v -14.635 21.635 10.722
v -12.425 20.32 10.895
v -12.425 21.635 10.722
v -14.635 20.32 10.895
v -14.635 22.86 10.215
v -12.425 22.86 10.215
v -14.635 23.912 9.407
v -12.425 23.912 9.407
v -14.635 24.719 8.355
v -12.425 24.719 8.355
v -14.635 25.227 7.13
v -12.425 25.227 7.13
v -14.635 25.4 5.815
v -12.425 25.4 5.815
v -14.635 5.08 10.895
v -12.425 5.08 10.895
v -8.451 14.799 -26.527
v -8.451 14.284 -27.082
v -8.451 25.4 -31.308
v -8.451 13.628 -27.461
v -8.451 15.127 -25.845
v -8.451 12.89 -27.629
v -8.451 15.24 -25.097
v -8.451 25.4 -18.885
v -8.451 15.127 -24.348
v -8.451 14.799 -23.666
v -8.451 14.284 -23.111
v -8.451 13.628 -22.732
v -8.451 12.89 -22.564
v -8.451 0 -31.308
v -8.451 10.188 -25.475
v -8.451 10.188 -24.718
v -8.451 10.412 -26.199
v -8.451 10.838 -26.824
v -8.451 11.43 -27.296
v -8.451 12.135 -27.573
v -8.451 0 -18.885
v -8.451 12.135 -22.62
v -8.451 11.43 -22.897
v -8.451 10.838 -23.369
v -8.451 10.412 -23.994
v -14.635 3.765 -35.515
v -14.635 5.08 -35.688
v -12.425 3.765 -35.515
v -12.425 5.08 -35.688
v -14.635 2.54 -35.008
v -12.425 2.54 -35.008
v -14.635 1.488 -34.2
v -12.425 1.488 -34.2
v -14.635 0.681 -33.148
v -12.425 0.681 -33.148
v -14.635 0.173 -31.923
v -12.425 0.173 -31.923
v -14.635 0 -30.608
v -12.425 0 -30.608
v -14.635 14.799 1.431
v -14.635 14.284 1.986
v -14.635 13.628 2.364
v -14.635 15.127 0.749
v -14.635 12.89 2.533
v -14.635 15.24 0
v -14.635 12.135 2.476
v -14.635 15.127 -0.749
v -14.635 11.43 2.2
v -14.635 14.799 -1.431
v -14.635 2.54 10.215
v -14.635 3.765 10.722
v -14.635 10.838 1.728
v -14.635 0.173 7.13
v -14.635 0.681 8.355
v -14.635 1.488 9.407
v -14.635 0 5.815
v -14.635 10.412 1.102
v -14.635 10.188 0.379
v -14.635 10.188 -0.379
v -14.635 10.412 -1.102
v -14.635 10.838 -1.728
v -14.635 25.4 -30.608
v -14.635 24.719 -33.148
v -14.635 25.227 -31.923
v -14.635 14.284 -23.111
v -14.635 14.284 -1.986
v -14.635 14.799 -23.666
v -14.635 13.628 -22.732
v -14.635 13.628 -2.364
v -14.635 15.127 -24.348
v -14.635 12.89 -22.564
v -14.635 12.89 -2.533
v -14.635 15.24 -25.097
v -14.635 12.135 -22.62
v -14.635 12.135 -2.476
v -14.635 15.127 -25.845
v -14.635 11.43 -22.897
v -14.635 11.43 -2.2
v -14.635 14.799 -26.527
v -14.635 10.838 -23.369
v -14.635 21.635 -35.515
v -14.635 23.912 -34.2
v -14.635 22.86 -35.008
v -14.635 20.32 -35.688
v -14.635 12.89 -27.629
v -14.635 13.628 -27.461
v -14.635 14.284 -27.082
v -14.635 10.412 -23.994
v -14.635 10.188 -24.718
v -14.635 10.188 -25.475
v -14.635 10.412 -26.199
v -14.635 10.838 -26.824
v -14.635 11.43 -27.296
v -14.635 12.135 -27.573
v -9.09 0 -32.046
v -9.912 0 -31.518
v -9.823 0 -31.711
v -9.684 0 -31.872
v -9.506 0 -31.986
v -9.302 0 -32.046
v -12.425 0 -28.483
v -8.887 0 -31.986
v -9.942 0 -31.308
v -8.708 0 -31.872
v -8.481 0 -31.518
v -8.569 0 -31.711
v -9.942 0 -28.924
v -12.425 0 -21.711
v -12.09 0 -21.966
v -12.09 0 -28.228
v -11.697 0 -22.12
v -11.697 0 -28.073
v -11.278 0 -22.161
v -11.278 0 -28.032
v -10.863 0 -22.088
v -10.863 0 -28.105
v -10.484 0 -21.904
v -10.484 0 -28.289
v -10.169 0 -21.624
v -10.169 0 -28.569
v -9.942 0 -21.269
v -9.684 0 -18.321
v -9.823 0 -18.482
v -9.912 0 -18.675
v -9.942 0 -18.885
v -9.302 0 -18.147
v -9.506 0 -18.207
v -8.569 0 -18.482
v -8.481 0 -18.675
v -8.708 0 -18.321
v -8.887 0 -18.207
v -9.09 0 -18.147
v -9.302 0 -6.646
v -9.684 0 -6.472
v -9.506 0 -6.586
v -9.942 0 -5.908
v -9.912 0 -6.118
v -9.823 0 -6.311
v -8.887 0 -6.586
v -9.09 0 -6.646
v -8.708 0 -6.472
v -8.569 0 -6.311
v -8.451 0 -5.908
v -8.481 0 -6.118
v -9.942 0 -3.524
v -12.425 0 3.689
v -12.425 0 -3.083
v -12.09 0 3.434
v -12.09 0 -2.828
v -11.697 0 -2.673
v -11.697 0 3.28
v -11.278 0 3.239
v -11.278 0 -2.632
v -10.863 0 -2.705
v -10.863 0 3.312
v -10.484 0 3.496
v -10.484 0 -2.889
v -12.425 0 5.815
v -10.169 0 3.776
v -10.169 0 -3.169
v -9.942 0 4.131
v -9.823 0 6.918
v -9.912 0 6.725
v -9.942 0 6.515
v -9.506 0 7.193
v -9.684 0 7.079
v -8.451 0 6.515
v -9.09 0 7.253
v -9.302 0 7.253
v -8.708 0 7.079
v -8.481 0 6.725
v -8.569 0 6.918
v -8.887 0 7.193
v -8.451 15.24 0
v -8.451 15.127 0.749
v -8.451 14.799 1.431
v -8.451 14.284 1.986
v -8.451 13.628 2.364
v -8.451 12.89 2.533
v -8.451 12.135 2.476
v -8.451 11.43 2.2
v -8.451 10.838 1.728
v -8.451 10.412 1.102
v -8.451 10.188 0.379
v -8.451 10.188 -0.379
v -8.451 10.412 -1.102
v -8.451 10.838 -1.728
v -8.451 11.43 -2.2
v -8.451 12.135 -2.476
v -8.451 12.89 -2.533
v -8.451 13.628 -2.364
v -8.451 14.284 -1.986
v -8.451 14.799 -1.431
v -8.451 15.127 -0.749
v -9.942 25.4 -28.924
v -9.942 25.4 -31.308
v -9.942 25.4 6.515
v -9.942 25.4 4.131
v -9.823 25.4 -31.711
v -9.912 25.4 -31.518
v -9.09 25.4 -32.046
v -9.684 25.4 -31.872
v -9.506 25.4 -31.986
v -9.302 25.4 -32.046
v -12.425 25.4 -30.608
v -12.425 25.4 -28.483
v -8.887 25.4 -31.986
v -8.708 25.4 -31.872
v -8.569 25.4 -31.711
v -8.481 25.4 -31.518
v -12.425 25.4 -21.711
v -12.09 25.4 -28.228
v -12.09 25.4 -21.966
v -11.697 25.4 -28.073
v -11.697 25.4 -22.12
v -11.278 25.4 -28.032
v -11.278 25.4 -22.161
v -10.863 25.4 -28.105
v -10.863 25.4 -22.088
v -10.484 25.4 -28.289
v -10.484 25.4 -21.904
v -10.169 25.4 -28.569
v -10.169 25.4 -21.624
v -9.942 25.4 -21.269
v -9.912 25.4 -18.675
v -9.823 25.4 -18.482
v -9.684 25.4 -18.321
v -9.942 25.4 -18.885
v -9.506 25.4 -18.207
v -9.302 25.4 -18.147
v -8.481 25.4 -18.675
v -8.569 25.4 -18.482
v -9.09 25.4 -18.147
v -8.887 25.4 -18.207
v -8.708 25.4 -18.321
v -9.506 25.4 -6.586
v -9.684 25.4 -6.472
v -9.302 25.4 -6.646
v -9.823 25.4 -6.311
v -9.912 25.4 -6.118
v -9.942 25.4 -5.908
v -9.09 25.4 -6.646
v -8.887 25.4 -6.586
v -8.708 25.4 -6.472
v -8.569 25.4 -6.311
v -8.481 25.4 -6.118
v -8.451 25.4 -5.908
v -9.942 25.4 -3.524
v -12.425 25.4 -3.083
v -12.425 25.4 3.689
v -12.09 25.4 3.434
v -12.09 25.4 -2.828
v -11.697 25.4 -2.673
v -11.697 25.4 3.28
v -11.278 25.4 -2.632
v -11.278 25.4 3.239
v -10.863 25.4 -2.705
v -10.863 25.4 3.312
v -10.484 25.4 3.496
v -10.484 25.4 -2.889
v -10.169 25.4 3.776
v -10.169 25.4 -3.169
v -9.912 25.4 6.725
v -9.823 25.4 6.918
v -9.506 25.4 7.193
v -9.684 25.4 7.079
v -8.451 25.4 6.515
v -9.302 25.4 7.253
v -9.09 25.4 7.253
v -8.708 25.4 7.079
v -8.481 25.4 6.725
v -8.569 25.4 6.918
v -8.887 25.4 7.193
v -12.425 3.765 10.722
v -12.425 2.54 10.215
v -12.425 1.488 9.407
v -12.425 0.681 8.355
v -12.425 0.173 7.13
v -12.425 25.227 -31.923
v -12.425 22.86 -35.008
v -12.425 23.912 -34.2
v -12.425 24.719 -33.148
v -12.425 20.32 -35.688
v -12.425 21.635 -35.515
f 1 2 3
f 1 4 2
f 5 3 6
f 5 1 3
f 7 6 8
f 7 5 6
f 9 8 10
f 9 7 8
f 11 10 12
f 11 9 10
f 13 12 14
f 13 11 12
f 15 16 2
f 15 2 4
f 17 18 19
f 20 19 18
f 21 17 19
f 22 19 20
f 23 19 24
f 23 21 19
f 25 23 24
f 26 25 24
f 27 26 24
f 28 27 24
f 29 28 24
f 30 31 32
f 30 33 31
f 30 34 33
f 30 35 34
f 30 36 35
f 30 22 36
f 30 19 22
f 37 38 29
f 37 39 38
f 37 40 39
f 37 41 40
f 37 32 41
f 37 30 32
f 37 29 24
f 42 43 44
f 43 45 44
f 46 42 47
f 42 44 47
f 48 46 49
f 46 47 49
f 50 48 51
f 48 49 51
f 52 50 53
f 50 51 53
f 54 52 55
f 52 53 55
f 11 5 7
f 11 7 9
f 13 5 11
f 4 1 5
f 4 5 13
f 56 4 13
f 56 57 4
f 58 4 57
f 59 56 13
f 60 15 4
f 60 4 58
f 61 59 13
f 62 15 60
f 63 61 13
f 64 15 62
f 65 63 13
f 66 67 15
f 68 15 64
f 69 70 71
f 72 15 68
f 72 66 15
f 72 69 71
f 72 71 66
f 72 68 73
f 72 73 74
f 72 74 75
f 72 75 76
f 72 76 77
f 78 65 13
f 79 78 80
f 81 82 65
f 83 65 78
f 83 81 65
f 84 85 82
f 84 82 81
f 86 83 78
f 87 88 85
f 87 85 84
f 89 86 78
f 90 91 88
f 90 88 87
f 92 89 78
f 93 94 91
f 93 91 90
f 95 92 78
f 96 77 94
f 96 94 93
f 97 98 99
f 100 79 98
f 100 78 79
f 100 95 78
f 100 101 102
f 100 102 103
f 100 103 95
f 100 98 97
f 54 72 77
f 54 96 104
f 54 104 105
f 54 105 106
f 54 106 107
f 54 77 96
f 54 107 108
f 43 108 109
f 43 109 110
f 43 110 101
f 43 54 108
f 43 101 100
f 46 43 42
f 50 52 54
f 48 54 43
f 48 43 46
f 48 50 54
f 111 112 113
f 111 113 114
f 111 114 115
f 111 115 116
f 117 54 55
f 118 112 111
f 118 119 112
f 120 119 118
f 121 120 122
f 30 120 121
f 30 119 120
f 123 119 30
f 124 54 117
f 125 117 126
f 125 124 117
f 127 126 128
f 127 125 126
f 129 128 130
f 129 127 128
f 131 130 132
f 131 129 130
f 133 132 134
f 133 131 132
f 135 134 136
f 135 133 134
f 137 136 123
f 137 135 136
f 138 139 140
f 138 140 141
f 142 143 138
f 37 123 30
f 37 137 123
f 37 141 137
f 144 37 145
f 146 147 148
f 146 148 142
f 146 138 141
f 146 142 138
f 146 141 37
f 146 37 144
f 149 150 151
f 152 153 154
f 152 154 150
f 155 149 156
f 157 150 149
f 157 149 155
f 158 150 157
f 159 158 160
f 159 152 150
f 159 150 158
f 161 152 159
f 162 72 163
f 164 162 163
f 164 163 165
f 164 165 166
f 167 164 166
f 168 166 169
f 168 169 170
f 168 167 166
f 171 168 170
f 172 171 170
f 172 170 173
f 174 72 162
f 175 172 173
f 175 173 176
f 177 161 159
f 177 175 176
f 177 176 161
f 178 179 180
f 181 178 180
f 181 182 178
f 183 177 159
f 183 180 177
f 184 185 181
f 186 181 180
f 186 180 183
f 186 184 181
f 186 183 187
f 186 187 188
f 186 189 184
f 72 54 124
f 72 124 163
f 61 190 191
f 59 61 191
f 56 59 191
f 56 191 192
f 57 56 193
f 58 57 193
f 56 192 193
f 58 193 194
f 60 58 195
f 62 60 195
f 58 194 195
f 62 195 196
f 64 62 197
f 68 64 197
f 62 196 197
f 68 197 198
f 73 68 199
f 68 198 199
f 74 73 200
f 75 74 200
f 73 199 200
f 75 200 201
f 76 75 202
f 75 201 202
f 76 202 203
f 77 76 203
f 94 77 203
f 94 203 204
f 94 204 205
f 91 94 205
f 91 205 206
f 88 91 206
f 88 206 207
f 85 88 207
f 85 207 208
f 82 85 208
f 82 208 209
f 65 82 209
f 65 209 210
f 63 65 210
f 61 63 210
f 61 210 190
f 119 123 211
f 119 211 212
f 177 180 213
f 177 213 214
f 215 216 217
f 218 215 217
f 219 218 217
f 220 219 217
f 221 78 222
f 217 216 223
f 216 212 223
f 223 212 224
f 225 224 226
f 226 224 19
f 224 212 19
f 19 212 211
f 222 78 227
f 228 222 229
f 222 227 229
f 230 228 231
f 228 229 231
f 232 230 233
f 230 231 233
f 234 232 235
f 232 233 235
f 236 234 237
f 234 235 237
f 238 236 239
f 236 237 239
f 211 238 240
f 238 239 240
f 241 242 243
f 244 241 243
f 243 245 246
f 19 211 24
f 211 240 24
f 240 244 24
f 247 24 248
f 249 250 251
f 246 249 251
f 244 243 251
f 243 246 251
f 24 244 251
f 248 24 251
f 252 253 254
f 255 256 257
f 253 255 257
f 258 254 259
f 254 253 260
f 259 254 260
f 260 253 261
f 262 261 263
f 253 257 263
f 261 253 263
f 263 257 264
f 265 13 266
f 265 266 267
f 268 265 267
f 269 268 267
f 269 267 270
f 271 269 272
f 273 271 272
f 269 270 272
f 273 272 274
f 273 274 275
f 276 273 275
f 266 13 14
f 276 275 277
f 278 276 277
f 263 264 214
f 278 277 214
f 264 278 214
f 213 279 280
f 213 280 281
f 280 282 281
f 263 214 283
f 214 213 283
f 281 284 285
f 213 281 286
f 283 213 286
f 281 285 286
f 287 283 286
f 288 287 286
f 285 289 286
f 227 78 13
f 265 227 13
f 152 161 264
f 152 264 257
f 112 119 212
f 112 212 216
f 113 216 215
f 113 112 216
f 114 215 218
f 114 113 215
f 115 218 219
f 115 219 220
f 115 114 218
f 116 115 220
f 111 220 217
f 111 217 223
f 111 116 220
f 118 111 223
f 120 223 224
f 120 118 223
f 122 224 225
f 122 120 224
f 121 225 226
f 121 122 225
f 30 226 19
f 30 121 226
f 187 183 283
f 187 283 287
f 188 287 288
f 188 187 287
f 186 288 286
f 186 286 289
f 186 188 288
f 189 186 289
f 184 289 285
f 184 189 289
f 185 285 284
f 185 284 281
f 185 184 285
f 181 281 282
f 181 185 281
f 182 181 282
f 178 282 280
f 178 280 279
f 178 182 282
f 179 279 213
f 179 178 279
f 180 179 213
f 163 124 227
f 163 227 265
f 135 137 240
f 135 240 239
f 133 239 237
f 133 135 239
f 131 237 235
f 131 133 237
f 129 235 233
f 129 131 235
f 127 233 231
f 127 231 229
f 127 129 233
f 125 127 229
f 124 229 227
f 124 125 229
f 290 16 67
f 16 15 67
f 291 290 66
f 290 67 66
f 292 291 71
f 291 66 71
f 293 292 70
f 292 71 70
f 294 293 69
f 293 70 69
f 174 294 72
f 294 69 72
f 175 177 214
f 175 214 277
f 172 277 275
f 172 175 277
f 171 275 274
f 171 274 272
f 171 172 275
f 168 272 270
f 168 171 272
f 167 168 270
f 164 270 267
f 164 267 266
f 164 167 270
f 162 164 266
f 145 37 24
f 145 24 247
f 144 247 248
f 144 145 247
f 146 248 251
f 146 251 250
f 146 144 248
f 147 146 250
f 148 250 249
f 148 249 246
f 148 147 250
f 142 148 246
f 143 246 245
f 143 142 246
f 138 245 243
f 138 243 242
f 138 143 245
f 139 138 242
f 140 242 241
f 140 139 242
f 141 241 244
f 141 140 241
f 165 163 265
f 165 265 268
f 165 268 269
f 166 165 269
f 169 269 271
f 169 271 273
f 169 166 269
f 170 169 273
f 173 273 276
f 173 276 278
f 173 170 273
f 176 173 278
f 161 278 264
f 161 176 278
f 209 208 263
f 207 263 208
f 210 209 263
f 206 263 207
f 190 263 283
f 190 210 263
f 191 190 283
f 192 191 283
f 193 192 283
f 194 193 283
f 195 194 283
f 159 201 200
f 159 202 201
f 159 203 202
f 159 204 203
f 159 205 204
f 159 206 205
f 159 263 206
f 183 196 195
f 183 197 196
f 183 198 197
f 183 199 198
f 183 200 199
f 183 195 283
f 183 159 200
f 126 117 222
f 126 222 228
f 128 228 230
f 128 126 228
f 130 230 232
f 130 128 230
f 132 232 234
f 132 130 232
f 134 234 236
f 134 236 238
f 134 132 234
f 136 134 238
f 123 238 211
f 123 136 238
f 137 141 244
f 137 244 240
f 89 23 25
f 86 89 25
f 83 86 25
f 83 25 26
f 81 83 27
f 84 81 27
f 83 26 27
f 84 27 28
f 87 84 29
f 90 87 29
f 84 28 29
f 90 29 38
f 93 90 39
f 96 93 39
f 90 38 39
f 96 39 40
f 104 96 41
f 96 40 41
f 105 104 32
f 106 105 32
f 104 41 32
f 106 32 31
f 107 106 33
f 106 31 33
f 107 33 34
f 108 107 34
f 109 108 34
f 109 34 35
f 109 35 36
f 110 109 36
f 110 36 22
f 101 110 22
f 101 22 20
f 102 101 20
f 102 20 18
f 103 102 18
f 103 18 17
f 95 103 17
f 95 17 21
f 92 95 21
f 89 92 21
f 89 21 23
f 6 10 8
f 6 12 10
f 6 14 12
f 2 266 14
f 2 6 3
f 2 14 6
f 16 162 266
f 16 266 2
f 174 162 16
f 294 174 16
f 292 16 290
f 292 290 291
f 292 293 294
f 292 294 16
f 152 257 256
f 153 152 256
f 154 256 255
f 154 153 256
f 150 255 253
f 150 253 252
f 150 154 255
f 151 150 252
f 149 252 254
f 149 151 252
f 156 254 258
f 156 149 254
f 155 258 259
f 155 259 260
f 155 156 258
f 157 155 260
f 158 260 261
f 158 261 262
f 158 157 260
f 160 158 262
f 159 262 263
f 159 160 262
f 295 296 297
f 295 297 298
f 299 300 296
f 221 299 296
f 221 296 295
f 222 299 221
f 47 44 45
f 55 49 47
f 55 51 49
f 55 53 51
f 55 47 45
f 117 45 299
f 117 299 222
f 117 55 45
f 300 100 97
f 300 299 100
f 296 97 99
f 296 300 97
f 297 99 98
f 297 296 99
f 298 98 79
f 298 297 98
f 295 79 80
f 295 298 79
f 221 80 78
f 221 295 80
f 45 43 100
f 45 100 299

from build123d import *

# Parameters (mm, degrees)
F1_DEPTH = 25.4
F2_R     = 5.08
F3_R     = 2.54
F4_DEPTH = 25.4
F5_R     = 2.54
F6_DEPTH = 25.4


with BuildPart() as f1:
    # F0 (on Front) → F1 (new body)
    with BuildSketch(Plane.XZ):
        with BuildLine():
            Line((-12.425265, 4.646856), (-12.425265, 10.895256))
            Line((-12.425265, 10.895256), (-14.635065, 10.895256))
            Line((-14.635065, 10.895256), (-14.635065, -10.288344))
            Line((-14.635065, -10.288344), (-14.635065, -35.688344))
            Line((-14.635065, -35.688344), (-12.425265, -35.688344))
            Line((-12.425265, -35.688344), (-12.425265, -29.439944))
            Line((-12.425265, -29.439944), (-12.425265, -28.48251))
            ThreePointArc((-12.425265, -28.48251), (-11.068052, -28.054224), (-9.941773, -28.924254))
            Line((-9.941773, -28.924254), (-9.941773, -31.308309))
            ThreePointArc((-9.941773, -31.308309), (-9.196233, -32.05385), (-8.450692, -31.308309))
            Line((-8.450692, -31.308309), (-8.450692, -18.884778))
            ThreePointArc((-8.450692, -18.884778), (-9.196233, -18.139237), (-9.941773, -18.884778))
            Line((-9.941773, -18.884778), (-9.941773, -21.268833))
            ThreePointArc((-9.941773, -21.268833), (-11.068052, -22.138863), (-12.425265, -21.710577))
            Line((-12.425265, -21.710577), (-12.425265, -20.753144))
            Line((-12.425265, -20.753144), (-12.425265, -14.504744))
            Line((-12.425265, -14.504744), (-12.425265, -10.288344))
            Line((-12.425265, -10.288344), (-12.425265, -4.039944))
            Line((-12.425265, -4.039944), (-12.425265, -3.08251))
            ThreePointArc((-12.425265, -3.08251), (-11.068052, -2.654224), (-9.941773, -3.524254))
            Line((-9.941773, -3.524254), (-9.941773, -5.908309))
            ThreePointArc((-9.941773, -5.908309), (-9.196233, -6.65385), (-8.450692, -5.908309))
            Line((-8.450692, -5.908309), (-8.450692, 6.515222))
            ThreePointArc((-8.450692, 6.515222), (-9.196233, 7.260763), (-9.941773, 6.515222))
            Line((-9.941773, 6.515222), (-9.941773, 4.131167))
            ThreePointArc((-9.941773, 4.131167), (-11.068052, 3.261137), (-12.425265, 3.689423))
            Line((-12.425265, 3.689423), (-12.425265, 4.646856))
        make_face()
    extrude(amount=-F1_DEPTH)

    # F2
    f2_edges = [f1.edges().sort_by_distance(p)[0] for p in [
        (-13.530165, 25.4, -35.688344),
        (-13.530165, 0, -35.688344),
        (-13.530165, 25.4, 10.895256),
        (-13.530165, 0, 10.895256),
    ]]
    fillet(f2_edges, radius=F2_R)

    # F3 (on face) → F4 (cut)
    with BuildSketch(Plane.YZ.offset(-8.450692)):
        with Locations((12.7, 0)):
            Circle(F3_R)
    extrude(amount=-F4_DEPTH, mode=Mode.SUBTRACT)

    # F5 (on face) → F6 (cut)
    with BuildSketch(Plane.YZ.offset(-8.450692)):
        with Locations((12.7, -25.096544)):
            Circle(F5_R)
    extrude(amount=-F6_DEPTH, mode=Mode.SUBTRACT)


solid = f1.part
